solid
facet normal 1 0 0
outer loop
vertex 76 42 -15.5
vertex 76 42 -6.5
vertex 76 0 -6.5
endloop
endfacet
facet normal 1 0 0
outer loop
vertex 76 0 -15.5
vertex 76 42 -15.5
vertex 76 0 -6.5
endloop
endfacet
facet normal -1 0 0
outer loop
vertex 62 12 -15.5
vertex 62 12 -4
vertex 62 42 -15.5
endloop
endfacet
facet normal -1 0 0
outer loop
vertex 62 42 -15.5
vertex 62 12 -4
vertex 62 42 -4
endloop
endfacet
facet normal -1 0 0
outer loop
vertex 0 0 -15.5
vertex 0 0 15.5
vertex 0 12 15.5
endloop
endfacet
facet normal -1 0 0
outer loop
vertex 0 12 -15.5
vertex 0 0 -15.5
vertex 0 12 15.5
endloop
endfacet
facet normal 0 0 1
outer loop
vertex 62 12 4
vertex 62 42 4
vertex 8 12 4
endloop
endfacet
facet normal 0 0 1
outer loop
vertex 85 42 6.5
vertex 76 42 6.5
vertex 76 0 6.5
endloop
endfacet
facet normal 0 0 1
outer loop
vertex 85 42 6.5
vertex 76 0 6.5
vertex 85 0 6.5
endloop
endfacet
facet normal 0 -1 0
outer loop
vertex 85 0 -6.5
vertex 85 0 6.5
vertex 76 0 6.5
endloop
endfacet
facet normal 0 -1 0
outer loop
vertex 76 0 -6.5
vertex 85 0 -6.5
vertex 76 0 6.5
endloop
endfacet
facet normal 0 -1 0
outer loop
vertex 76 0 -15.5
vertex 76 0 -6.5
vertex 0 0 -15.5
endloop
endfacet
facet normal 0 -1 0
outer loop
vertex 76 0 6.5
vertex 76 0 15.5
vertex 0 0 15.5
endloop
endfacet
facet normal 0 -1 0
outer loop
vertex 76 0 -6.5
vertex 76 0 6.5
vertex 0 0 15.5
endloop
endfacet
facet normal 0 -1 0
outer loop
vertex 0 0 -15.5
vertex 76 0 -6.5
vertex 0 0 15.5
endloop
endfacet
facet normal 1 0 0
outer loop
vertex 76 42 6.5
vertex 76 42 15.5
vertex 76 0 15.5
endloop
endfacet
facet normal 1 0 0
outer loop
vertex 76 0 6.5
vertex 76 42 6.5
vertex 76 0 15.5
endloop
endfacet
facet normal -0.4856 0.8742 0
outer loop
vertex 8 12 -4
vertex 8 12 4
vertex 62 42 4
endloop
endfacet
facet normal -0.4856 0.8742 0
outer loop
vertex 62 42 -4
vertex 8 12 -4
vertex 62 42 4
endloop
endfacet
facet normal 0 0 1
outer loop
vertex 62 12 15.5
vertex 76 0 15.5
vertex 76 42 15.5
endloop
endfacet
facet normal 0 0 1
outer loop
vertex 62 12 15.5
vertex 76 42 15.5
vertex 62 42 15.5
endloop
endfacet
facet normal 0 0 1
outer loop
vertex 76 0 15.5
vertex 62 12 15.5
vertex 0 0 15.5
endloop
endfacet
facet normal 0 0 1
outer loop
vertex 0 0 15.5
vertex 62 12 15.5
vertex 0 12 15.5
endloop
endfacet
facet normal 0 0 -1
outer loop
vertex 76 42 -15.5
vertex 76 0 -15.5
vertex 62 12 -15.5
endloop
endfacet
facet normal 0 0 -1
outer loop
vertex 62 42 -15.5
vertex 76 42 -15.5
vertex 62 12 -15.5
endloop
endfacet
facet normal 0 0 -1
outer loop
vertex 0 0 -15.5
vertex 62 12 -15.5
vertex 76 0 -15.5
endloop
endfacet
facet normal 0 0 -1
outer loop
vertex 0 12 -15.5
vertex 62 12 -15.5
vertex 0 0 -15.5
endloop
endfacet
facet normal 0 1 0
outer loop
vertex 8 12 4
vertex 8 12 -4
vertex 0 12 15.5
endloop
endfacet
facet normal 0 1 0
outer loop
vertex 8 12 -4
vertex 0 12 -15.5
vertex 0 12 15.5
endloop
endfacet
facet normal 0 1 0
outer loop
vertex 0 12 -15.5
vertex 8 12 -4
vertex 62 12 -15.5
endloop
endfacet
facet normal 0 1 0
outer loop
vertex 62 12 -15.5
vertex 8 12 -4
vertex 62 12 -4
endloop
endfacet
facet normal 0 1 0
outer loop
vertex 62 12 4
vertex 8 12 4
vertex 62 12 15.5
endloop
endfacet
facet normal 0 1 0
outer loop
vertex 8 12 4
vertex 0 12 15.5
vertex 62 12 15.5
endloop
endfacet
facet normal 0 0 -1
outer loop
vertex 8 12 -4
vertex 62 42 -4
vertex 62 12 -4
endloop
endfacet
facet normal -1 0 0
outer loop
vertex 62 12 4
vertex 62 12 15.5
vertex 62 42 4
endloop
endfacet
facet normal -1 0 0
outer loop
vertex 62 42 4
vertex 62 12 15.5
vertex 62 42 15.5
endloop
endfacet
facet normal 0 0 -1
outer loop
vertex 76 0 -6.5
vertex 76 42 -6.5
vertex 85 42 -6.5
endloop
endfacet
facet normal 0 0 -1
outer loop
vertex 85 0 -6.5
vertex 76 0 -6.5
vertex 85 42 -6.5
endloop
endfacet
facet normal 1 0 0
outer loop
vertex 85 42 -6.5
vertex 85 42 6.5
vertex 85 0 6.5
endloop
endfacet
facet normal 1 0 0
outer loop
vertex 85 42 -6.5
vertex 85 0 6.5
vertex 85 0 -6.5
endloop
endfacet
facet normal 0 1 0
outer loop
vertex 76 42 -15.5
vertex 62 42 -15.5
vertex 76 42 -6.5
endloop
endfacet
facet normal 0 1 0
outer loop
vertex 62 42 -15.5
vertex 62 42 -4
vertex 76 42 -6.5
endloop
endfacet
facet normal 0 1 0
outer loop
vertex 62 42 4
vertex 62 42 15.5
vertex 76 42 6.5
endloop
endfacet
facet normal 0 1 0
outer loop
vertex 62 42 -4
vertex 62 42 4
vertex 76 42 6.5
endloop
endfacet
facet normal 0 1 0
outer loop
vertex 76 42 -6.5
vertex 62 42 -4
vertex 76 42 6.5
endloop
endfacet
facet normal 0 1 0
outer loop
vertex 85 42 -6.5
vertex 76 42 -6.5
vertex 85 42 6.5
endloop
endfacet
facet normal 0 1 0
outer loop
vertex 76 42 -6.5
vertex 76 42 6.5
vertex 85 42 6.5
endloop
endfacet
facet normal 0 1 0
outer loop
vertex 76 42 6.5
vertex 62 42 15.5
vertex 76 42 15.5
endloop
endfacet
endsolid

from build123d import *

# Parameters (mm, degrees)
BOSS_EXTRUDE1_DEPTH = 15.5
BOSS_EXTRUDE2_DEPTH = 4
SKETCH3_W           = 9
SKETCH3_H           = 13
BOSS_EXTRUDE3_DEPTH = 42


with BuildPart() as part:
    # Sketch1 → Boss-Extrude1 (new, symmetric)
    with BuildSketch(Plane.XY):
        Polygon((0, 0), (0, 12), (62, 12), (62, 42), (76, 42), (76, 0), align=None)
    extrude(amount=BOSS_EXTRUDE1_DEPTH, both=True)

    # Sketch2 → Boss-Extrude2 (add, symmetric)
    with BuildSketch(Plane.XY):
        Polygon((8, 12), (62, 42), (62, 12), align=None)
    extrude(amount=BOSS_EXTRUDE2_DEPTH, both=True)

    # Sketch3 → Boss-Extrude3 (add, through all)
    with BuildSketch(Plane(origin=(0, 42, 0), x_dir=(1, 0, 0), z_dir=(0, 1, 0))):
        with Locations((80.5, 0)):
            Rectangle(SKETCH3_W, SKETCH3_H)
    extrude(amount=-BOSS_EXTRUDE3_DEPTH)


solid = part.part
